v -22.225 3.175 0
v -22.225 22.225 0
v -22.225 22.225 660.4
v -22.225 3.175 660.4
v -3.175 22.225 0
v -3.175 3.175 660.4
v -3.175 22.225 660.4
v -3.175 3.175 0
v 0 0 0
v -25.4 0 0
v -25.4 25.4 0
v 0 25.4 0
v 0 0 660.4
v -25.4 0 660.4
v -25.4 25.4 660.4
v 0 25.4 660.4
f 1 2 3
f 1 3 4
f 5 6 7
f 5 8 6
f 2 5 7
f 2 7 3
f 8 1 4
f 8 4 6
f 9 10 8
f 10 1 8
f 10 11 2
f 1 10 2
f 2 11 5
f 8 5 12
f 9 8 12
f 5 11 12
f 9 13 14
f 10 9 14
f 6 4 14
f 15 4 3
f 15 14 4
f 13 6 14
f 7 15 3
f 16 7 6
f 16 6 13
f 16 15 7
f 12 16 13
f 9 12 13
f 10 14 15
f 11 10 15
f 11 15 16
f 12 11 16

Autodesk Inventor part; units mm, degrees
ref_plane "YZ Plane" through (0, 0, 0) normal (1, 0, 0) x (0, 1, 0)
ref_plane "XZ Plane" through (0, 0, 0) normal (0, 1, 0) x (-1, 0, 0)
ref_plane "XY Plane" through (0, 0, 0) normal (0, 0, 1) x (1, 0, 0)
sketch "Sketch1" plane through (0, 0, 0) normal (0, 0, 1) x (1, 0, 0)
  line L0 (0, 0) -> (-25.4, 0)
  line L1 (-25.4, 0) -> (-25.4, 25.4)
  line L2 (-25.4, 25.4) -> (0, 25.4)
  line L3 (0, 25.4) -> (0, 0)
  line L4 (-3.175, 22.225) -> (-22.225, 22.225)
  line L5 (-22.225, 22.225) -> (-22.225, 3.175)
  line L6 (-22.225, 3.175) -> (-3.175, 3.175)
  line L7 (-3.175, 3.175) -> (-3.175, 22.225)
  dimension "d0" = 25.4
  dimension "d2" = 25.4
  dimension "d3" = 3.175
extrude "Extrusion1" add sketch "Sketch1" along normal blind 660.4
sketch "Sketch2" plane through (0, 0, 0) normal (1, 0, 0) x (0, 0, -1)
  line L0 (0, 25.4) -> (0, 0) projected
  line L1 (0, 25.4) -> (-660.4, 25.4) projected
  line L2 (-660.4, 0) -> (-660.4, 25.4) projected
  line L3 (0, 0) -> (-660.4, 0) projected
  line L4 (-113.1604, 25.4) -> (-351.652, -111.264)
  line L5 (-351.652, -111.264) -> (-415.4102, 0)
  line L6 (-113.1604, 0) -> (0, 0)
  line L7 (-113.1604, 25.4) -> (0, 25.4)
  line L8 (0, 25.4) -> (0, 0)
  line L9 (-444.6849, 0) -> (-660.4, 0)
  line L10 (-660.4, 0) -> (-660.4, 25.4)
  line L11 (-660.4, 25.4) -> (-429.9653, 25.4)
  line L12 (-429.9653, 25.4) -> (-415.4102, 0)
  line L13 (-113.1604, 25.4) -> (-100.5318, 3.3619)
  line L14 (-100.5318, 3.3619) -> (-361.0615, -145.9308)
  line L15 (-361.0615, -145.9308) -> (-444.6849, 0)
  dimension "d6" = 25.4
  dimension "d9" = 25.4
  dimension "d12" = 25.4
properties part number "bar"
